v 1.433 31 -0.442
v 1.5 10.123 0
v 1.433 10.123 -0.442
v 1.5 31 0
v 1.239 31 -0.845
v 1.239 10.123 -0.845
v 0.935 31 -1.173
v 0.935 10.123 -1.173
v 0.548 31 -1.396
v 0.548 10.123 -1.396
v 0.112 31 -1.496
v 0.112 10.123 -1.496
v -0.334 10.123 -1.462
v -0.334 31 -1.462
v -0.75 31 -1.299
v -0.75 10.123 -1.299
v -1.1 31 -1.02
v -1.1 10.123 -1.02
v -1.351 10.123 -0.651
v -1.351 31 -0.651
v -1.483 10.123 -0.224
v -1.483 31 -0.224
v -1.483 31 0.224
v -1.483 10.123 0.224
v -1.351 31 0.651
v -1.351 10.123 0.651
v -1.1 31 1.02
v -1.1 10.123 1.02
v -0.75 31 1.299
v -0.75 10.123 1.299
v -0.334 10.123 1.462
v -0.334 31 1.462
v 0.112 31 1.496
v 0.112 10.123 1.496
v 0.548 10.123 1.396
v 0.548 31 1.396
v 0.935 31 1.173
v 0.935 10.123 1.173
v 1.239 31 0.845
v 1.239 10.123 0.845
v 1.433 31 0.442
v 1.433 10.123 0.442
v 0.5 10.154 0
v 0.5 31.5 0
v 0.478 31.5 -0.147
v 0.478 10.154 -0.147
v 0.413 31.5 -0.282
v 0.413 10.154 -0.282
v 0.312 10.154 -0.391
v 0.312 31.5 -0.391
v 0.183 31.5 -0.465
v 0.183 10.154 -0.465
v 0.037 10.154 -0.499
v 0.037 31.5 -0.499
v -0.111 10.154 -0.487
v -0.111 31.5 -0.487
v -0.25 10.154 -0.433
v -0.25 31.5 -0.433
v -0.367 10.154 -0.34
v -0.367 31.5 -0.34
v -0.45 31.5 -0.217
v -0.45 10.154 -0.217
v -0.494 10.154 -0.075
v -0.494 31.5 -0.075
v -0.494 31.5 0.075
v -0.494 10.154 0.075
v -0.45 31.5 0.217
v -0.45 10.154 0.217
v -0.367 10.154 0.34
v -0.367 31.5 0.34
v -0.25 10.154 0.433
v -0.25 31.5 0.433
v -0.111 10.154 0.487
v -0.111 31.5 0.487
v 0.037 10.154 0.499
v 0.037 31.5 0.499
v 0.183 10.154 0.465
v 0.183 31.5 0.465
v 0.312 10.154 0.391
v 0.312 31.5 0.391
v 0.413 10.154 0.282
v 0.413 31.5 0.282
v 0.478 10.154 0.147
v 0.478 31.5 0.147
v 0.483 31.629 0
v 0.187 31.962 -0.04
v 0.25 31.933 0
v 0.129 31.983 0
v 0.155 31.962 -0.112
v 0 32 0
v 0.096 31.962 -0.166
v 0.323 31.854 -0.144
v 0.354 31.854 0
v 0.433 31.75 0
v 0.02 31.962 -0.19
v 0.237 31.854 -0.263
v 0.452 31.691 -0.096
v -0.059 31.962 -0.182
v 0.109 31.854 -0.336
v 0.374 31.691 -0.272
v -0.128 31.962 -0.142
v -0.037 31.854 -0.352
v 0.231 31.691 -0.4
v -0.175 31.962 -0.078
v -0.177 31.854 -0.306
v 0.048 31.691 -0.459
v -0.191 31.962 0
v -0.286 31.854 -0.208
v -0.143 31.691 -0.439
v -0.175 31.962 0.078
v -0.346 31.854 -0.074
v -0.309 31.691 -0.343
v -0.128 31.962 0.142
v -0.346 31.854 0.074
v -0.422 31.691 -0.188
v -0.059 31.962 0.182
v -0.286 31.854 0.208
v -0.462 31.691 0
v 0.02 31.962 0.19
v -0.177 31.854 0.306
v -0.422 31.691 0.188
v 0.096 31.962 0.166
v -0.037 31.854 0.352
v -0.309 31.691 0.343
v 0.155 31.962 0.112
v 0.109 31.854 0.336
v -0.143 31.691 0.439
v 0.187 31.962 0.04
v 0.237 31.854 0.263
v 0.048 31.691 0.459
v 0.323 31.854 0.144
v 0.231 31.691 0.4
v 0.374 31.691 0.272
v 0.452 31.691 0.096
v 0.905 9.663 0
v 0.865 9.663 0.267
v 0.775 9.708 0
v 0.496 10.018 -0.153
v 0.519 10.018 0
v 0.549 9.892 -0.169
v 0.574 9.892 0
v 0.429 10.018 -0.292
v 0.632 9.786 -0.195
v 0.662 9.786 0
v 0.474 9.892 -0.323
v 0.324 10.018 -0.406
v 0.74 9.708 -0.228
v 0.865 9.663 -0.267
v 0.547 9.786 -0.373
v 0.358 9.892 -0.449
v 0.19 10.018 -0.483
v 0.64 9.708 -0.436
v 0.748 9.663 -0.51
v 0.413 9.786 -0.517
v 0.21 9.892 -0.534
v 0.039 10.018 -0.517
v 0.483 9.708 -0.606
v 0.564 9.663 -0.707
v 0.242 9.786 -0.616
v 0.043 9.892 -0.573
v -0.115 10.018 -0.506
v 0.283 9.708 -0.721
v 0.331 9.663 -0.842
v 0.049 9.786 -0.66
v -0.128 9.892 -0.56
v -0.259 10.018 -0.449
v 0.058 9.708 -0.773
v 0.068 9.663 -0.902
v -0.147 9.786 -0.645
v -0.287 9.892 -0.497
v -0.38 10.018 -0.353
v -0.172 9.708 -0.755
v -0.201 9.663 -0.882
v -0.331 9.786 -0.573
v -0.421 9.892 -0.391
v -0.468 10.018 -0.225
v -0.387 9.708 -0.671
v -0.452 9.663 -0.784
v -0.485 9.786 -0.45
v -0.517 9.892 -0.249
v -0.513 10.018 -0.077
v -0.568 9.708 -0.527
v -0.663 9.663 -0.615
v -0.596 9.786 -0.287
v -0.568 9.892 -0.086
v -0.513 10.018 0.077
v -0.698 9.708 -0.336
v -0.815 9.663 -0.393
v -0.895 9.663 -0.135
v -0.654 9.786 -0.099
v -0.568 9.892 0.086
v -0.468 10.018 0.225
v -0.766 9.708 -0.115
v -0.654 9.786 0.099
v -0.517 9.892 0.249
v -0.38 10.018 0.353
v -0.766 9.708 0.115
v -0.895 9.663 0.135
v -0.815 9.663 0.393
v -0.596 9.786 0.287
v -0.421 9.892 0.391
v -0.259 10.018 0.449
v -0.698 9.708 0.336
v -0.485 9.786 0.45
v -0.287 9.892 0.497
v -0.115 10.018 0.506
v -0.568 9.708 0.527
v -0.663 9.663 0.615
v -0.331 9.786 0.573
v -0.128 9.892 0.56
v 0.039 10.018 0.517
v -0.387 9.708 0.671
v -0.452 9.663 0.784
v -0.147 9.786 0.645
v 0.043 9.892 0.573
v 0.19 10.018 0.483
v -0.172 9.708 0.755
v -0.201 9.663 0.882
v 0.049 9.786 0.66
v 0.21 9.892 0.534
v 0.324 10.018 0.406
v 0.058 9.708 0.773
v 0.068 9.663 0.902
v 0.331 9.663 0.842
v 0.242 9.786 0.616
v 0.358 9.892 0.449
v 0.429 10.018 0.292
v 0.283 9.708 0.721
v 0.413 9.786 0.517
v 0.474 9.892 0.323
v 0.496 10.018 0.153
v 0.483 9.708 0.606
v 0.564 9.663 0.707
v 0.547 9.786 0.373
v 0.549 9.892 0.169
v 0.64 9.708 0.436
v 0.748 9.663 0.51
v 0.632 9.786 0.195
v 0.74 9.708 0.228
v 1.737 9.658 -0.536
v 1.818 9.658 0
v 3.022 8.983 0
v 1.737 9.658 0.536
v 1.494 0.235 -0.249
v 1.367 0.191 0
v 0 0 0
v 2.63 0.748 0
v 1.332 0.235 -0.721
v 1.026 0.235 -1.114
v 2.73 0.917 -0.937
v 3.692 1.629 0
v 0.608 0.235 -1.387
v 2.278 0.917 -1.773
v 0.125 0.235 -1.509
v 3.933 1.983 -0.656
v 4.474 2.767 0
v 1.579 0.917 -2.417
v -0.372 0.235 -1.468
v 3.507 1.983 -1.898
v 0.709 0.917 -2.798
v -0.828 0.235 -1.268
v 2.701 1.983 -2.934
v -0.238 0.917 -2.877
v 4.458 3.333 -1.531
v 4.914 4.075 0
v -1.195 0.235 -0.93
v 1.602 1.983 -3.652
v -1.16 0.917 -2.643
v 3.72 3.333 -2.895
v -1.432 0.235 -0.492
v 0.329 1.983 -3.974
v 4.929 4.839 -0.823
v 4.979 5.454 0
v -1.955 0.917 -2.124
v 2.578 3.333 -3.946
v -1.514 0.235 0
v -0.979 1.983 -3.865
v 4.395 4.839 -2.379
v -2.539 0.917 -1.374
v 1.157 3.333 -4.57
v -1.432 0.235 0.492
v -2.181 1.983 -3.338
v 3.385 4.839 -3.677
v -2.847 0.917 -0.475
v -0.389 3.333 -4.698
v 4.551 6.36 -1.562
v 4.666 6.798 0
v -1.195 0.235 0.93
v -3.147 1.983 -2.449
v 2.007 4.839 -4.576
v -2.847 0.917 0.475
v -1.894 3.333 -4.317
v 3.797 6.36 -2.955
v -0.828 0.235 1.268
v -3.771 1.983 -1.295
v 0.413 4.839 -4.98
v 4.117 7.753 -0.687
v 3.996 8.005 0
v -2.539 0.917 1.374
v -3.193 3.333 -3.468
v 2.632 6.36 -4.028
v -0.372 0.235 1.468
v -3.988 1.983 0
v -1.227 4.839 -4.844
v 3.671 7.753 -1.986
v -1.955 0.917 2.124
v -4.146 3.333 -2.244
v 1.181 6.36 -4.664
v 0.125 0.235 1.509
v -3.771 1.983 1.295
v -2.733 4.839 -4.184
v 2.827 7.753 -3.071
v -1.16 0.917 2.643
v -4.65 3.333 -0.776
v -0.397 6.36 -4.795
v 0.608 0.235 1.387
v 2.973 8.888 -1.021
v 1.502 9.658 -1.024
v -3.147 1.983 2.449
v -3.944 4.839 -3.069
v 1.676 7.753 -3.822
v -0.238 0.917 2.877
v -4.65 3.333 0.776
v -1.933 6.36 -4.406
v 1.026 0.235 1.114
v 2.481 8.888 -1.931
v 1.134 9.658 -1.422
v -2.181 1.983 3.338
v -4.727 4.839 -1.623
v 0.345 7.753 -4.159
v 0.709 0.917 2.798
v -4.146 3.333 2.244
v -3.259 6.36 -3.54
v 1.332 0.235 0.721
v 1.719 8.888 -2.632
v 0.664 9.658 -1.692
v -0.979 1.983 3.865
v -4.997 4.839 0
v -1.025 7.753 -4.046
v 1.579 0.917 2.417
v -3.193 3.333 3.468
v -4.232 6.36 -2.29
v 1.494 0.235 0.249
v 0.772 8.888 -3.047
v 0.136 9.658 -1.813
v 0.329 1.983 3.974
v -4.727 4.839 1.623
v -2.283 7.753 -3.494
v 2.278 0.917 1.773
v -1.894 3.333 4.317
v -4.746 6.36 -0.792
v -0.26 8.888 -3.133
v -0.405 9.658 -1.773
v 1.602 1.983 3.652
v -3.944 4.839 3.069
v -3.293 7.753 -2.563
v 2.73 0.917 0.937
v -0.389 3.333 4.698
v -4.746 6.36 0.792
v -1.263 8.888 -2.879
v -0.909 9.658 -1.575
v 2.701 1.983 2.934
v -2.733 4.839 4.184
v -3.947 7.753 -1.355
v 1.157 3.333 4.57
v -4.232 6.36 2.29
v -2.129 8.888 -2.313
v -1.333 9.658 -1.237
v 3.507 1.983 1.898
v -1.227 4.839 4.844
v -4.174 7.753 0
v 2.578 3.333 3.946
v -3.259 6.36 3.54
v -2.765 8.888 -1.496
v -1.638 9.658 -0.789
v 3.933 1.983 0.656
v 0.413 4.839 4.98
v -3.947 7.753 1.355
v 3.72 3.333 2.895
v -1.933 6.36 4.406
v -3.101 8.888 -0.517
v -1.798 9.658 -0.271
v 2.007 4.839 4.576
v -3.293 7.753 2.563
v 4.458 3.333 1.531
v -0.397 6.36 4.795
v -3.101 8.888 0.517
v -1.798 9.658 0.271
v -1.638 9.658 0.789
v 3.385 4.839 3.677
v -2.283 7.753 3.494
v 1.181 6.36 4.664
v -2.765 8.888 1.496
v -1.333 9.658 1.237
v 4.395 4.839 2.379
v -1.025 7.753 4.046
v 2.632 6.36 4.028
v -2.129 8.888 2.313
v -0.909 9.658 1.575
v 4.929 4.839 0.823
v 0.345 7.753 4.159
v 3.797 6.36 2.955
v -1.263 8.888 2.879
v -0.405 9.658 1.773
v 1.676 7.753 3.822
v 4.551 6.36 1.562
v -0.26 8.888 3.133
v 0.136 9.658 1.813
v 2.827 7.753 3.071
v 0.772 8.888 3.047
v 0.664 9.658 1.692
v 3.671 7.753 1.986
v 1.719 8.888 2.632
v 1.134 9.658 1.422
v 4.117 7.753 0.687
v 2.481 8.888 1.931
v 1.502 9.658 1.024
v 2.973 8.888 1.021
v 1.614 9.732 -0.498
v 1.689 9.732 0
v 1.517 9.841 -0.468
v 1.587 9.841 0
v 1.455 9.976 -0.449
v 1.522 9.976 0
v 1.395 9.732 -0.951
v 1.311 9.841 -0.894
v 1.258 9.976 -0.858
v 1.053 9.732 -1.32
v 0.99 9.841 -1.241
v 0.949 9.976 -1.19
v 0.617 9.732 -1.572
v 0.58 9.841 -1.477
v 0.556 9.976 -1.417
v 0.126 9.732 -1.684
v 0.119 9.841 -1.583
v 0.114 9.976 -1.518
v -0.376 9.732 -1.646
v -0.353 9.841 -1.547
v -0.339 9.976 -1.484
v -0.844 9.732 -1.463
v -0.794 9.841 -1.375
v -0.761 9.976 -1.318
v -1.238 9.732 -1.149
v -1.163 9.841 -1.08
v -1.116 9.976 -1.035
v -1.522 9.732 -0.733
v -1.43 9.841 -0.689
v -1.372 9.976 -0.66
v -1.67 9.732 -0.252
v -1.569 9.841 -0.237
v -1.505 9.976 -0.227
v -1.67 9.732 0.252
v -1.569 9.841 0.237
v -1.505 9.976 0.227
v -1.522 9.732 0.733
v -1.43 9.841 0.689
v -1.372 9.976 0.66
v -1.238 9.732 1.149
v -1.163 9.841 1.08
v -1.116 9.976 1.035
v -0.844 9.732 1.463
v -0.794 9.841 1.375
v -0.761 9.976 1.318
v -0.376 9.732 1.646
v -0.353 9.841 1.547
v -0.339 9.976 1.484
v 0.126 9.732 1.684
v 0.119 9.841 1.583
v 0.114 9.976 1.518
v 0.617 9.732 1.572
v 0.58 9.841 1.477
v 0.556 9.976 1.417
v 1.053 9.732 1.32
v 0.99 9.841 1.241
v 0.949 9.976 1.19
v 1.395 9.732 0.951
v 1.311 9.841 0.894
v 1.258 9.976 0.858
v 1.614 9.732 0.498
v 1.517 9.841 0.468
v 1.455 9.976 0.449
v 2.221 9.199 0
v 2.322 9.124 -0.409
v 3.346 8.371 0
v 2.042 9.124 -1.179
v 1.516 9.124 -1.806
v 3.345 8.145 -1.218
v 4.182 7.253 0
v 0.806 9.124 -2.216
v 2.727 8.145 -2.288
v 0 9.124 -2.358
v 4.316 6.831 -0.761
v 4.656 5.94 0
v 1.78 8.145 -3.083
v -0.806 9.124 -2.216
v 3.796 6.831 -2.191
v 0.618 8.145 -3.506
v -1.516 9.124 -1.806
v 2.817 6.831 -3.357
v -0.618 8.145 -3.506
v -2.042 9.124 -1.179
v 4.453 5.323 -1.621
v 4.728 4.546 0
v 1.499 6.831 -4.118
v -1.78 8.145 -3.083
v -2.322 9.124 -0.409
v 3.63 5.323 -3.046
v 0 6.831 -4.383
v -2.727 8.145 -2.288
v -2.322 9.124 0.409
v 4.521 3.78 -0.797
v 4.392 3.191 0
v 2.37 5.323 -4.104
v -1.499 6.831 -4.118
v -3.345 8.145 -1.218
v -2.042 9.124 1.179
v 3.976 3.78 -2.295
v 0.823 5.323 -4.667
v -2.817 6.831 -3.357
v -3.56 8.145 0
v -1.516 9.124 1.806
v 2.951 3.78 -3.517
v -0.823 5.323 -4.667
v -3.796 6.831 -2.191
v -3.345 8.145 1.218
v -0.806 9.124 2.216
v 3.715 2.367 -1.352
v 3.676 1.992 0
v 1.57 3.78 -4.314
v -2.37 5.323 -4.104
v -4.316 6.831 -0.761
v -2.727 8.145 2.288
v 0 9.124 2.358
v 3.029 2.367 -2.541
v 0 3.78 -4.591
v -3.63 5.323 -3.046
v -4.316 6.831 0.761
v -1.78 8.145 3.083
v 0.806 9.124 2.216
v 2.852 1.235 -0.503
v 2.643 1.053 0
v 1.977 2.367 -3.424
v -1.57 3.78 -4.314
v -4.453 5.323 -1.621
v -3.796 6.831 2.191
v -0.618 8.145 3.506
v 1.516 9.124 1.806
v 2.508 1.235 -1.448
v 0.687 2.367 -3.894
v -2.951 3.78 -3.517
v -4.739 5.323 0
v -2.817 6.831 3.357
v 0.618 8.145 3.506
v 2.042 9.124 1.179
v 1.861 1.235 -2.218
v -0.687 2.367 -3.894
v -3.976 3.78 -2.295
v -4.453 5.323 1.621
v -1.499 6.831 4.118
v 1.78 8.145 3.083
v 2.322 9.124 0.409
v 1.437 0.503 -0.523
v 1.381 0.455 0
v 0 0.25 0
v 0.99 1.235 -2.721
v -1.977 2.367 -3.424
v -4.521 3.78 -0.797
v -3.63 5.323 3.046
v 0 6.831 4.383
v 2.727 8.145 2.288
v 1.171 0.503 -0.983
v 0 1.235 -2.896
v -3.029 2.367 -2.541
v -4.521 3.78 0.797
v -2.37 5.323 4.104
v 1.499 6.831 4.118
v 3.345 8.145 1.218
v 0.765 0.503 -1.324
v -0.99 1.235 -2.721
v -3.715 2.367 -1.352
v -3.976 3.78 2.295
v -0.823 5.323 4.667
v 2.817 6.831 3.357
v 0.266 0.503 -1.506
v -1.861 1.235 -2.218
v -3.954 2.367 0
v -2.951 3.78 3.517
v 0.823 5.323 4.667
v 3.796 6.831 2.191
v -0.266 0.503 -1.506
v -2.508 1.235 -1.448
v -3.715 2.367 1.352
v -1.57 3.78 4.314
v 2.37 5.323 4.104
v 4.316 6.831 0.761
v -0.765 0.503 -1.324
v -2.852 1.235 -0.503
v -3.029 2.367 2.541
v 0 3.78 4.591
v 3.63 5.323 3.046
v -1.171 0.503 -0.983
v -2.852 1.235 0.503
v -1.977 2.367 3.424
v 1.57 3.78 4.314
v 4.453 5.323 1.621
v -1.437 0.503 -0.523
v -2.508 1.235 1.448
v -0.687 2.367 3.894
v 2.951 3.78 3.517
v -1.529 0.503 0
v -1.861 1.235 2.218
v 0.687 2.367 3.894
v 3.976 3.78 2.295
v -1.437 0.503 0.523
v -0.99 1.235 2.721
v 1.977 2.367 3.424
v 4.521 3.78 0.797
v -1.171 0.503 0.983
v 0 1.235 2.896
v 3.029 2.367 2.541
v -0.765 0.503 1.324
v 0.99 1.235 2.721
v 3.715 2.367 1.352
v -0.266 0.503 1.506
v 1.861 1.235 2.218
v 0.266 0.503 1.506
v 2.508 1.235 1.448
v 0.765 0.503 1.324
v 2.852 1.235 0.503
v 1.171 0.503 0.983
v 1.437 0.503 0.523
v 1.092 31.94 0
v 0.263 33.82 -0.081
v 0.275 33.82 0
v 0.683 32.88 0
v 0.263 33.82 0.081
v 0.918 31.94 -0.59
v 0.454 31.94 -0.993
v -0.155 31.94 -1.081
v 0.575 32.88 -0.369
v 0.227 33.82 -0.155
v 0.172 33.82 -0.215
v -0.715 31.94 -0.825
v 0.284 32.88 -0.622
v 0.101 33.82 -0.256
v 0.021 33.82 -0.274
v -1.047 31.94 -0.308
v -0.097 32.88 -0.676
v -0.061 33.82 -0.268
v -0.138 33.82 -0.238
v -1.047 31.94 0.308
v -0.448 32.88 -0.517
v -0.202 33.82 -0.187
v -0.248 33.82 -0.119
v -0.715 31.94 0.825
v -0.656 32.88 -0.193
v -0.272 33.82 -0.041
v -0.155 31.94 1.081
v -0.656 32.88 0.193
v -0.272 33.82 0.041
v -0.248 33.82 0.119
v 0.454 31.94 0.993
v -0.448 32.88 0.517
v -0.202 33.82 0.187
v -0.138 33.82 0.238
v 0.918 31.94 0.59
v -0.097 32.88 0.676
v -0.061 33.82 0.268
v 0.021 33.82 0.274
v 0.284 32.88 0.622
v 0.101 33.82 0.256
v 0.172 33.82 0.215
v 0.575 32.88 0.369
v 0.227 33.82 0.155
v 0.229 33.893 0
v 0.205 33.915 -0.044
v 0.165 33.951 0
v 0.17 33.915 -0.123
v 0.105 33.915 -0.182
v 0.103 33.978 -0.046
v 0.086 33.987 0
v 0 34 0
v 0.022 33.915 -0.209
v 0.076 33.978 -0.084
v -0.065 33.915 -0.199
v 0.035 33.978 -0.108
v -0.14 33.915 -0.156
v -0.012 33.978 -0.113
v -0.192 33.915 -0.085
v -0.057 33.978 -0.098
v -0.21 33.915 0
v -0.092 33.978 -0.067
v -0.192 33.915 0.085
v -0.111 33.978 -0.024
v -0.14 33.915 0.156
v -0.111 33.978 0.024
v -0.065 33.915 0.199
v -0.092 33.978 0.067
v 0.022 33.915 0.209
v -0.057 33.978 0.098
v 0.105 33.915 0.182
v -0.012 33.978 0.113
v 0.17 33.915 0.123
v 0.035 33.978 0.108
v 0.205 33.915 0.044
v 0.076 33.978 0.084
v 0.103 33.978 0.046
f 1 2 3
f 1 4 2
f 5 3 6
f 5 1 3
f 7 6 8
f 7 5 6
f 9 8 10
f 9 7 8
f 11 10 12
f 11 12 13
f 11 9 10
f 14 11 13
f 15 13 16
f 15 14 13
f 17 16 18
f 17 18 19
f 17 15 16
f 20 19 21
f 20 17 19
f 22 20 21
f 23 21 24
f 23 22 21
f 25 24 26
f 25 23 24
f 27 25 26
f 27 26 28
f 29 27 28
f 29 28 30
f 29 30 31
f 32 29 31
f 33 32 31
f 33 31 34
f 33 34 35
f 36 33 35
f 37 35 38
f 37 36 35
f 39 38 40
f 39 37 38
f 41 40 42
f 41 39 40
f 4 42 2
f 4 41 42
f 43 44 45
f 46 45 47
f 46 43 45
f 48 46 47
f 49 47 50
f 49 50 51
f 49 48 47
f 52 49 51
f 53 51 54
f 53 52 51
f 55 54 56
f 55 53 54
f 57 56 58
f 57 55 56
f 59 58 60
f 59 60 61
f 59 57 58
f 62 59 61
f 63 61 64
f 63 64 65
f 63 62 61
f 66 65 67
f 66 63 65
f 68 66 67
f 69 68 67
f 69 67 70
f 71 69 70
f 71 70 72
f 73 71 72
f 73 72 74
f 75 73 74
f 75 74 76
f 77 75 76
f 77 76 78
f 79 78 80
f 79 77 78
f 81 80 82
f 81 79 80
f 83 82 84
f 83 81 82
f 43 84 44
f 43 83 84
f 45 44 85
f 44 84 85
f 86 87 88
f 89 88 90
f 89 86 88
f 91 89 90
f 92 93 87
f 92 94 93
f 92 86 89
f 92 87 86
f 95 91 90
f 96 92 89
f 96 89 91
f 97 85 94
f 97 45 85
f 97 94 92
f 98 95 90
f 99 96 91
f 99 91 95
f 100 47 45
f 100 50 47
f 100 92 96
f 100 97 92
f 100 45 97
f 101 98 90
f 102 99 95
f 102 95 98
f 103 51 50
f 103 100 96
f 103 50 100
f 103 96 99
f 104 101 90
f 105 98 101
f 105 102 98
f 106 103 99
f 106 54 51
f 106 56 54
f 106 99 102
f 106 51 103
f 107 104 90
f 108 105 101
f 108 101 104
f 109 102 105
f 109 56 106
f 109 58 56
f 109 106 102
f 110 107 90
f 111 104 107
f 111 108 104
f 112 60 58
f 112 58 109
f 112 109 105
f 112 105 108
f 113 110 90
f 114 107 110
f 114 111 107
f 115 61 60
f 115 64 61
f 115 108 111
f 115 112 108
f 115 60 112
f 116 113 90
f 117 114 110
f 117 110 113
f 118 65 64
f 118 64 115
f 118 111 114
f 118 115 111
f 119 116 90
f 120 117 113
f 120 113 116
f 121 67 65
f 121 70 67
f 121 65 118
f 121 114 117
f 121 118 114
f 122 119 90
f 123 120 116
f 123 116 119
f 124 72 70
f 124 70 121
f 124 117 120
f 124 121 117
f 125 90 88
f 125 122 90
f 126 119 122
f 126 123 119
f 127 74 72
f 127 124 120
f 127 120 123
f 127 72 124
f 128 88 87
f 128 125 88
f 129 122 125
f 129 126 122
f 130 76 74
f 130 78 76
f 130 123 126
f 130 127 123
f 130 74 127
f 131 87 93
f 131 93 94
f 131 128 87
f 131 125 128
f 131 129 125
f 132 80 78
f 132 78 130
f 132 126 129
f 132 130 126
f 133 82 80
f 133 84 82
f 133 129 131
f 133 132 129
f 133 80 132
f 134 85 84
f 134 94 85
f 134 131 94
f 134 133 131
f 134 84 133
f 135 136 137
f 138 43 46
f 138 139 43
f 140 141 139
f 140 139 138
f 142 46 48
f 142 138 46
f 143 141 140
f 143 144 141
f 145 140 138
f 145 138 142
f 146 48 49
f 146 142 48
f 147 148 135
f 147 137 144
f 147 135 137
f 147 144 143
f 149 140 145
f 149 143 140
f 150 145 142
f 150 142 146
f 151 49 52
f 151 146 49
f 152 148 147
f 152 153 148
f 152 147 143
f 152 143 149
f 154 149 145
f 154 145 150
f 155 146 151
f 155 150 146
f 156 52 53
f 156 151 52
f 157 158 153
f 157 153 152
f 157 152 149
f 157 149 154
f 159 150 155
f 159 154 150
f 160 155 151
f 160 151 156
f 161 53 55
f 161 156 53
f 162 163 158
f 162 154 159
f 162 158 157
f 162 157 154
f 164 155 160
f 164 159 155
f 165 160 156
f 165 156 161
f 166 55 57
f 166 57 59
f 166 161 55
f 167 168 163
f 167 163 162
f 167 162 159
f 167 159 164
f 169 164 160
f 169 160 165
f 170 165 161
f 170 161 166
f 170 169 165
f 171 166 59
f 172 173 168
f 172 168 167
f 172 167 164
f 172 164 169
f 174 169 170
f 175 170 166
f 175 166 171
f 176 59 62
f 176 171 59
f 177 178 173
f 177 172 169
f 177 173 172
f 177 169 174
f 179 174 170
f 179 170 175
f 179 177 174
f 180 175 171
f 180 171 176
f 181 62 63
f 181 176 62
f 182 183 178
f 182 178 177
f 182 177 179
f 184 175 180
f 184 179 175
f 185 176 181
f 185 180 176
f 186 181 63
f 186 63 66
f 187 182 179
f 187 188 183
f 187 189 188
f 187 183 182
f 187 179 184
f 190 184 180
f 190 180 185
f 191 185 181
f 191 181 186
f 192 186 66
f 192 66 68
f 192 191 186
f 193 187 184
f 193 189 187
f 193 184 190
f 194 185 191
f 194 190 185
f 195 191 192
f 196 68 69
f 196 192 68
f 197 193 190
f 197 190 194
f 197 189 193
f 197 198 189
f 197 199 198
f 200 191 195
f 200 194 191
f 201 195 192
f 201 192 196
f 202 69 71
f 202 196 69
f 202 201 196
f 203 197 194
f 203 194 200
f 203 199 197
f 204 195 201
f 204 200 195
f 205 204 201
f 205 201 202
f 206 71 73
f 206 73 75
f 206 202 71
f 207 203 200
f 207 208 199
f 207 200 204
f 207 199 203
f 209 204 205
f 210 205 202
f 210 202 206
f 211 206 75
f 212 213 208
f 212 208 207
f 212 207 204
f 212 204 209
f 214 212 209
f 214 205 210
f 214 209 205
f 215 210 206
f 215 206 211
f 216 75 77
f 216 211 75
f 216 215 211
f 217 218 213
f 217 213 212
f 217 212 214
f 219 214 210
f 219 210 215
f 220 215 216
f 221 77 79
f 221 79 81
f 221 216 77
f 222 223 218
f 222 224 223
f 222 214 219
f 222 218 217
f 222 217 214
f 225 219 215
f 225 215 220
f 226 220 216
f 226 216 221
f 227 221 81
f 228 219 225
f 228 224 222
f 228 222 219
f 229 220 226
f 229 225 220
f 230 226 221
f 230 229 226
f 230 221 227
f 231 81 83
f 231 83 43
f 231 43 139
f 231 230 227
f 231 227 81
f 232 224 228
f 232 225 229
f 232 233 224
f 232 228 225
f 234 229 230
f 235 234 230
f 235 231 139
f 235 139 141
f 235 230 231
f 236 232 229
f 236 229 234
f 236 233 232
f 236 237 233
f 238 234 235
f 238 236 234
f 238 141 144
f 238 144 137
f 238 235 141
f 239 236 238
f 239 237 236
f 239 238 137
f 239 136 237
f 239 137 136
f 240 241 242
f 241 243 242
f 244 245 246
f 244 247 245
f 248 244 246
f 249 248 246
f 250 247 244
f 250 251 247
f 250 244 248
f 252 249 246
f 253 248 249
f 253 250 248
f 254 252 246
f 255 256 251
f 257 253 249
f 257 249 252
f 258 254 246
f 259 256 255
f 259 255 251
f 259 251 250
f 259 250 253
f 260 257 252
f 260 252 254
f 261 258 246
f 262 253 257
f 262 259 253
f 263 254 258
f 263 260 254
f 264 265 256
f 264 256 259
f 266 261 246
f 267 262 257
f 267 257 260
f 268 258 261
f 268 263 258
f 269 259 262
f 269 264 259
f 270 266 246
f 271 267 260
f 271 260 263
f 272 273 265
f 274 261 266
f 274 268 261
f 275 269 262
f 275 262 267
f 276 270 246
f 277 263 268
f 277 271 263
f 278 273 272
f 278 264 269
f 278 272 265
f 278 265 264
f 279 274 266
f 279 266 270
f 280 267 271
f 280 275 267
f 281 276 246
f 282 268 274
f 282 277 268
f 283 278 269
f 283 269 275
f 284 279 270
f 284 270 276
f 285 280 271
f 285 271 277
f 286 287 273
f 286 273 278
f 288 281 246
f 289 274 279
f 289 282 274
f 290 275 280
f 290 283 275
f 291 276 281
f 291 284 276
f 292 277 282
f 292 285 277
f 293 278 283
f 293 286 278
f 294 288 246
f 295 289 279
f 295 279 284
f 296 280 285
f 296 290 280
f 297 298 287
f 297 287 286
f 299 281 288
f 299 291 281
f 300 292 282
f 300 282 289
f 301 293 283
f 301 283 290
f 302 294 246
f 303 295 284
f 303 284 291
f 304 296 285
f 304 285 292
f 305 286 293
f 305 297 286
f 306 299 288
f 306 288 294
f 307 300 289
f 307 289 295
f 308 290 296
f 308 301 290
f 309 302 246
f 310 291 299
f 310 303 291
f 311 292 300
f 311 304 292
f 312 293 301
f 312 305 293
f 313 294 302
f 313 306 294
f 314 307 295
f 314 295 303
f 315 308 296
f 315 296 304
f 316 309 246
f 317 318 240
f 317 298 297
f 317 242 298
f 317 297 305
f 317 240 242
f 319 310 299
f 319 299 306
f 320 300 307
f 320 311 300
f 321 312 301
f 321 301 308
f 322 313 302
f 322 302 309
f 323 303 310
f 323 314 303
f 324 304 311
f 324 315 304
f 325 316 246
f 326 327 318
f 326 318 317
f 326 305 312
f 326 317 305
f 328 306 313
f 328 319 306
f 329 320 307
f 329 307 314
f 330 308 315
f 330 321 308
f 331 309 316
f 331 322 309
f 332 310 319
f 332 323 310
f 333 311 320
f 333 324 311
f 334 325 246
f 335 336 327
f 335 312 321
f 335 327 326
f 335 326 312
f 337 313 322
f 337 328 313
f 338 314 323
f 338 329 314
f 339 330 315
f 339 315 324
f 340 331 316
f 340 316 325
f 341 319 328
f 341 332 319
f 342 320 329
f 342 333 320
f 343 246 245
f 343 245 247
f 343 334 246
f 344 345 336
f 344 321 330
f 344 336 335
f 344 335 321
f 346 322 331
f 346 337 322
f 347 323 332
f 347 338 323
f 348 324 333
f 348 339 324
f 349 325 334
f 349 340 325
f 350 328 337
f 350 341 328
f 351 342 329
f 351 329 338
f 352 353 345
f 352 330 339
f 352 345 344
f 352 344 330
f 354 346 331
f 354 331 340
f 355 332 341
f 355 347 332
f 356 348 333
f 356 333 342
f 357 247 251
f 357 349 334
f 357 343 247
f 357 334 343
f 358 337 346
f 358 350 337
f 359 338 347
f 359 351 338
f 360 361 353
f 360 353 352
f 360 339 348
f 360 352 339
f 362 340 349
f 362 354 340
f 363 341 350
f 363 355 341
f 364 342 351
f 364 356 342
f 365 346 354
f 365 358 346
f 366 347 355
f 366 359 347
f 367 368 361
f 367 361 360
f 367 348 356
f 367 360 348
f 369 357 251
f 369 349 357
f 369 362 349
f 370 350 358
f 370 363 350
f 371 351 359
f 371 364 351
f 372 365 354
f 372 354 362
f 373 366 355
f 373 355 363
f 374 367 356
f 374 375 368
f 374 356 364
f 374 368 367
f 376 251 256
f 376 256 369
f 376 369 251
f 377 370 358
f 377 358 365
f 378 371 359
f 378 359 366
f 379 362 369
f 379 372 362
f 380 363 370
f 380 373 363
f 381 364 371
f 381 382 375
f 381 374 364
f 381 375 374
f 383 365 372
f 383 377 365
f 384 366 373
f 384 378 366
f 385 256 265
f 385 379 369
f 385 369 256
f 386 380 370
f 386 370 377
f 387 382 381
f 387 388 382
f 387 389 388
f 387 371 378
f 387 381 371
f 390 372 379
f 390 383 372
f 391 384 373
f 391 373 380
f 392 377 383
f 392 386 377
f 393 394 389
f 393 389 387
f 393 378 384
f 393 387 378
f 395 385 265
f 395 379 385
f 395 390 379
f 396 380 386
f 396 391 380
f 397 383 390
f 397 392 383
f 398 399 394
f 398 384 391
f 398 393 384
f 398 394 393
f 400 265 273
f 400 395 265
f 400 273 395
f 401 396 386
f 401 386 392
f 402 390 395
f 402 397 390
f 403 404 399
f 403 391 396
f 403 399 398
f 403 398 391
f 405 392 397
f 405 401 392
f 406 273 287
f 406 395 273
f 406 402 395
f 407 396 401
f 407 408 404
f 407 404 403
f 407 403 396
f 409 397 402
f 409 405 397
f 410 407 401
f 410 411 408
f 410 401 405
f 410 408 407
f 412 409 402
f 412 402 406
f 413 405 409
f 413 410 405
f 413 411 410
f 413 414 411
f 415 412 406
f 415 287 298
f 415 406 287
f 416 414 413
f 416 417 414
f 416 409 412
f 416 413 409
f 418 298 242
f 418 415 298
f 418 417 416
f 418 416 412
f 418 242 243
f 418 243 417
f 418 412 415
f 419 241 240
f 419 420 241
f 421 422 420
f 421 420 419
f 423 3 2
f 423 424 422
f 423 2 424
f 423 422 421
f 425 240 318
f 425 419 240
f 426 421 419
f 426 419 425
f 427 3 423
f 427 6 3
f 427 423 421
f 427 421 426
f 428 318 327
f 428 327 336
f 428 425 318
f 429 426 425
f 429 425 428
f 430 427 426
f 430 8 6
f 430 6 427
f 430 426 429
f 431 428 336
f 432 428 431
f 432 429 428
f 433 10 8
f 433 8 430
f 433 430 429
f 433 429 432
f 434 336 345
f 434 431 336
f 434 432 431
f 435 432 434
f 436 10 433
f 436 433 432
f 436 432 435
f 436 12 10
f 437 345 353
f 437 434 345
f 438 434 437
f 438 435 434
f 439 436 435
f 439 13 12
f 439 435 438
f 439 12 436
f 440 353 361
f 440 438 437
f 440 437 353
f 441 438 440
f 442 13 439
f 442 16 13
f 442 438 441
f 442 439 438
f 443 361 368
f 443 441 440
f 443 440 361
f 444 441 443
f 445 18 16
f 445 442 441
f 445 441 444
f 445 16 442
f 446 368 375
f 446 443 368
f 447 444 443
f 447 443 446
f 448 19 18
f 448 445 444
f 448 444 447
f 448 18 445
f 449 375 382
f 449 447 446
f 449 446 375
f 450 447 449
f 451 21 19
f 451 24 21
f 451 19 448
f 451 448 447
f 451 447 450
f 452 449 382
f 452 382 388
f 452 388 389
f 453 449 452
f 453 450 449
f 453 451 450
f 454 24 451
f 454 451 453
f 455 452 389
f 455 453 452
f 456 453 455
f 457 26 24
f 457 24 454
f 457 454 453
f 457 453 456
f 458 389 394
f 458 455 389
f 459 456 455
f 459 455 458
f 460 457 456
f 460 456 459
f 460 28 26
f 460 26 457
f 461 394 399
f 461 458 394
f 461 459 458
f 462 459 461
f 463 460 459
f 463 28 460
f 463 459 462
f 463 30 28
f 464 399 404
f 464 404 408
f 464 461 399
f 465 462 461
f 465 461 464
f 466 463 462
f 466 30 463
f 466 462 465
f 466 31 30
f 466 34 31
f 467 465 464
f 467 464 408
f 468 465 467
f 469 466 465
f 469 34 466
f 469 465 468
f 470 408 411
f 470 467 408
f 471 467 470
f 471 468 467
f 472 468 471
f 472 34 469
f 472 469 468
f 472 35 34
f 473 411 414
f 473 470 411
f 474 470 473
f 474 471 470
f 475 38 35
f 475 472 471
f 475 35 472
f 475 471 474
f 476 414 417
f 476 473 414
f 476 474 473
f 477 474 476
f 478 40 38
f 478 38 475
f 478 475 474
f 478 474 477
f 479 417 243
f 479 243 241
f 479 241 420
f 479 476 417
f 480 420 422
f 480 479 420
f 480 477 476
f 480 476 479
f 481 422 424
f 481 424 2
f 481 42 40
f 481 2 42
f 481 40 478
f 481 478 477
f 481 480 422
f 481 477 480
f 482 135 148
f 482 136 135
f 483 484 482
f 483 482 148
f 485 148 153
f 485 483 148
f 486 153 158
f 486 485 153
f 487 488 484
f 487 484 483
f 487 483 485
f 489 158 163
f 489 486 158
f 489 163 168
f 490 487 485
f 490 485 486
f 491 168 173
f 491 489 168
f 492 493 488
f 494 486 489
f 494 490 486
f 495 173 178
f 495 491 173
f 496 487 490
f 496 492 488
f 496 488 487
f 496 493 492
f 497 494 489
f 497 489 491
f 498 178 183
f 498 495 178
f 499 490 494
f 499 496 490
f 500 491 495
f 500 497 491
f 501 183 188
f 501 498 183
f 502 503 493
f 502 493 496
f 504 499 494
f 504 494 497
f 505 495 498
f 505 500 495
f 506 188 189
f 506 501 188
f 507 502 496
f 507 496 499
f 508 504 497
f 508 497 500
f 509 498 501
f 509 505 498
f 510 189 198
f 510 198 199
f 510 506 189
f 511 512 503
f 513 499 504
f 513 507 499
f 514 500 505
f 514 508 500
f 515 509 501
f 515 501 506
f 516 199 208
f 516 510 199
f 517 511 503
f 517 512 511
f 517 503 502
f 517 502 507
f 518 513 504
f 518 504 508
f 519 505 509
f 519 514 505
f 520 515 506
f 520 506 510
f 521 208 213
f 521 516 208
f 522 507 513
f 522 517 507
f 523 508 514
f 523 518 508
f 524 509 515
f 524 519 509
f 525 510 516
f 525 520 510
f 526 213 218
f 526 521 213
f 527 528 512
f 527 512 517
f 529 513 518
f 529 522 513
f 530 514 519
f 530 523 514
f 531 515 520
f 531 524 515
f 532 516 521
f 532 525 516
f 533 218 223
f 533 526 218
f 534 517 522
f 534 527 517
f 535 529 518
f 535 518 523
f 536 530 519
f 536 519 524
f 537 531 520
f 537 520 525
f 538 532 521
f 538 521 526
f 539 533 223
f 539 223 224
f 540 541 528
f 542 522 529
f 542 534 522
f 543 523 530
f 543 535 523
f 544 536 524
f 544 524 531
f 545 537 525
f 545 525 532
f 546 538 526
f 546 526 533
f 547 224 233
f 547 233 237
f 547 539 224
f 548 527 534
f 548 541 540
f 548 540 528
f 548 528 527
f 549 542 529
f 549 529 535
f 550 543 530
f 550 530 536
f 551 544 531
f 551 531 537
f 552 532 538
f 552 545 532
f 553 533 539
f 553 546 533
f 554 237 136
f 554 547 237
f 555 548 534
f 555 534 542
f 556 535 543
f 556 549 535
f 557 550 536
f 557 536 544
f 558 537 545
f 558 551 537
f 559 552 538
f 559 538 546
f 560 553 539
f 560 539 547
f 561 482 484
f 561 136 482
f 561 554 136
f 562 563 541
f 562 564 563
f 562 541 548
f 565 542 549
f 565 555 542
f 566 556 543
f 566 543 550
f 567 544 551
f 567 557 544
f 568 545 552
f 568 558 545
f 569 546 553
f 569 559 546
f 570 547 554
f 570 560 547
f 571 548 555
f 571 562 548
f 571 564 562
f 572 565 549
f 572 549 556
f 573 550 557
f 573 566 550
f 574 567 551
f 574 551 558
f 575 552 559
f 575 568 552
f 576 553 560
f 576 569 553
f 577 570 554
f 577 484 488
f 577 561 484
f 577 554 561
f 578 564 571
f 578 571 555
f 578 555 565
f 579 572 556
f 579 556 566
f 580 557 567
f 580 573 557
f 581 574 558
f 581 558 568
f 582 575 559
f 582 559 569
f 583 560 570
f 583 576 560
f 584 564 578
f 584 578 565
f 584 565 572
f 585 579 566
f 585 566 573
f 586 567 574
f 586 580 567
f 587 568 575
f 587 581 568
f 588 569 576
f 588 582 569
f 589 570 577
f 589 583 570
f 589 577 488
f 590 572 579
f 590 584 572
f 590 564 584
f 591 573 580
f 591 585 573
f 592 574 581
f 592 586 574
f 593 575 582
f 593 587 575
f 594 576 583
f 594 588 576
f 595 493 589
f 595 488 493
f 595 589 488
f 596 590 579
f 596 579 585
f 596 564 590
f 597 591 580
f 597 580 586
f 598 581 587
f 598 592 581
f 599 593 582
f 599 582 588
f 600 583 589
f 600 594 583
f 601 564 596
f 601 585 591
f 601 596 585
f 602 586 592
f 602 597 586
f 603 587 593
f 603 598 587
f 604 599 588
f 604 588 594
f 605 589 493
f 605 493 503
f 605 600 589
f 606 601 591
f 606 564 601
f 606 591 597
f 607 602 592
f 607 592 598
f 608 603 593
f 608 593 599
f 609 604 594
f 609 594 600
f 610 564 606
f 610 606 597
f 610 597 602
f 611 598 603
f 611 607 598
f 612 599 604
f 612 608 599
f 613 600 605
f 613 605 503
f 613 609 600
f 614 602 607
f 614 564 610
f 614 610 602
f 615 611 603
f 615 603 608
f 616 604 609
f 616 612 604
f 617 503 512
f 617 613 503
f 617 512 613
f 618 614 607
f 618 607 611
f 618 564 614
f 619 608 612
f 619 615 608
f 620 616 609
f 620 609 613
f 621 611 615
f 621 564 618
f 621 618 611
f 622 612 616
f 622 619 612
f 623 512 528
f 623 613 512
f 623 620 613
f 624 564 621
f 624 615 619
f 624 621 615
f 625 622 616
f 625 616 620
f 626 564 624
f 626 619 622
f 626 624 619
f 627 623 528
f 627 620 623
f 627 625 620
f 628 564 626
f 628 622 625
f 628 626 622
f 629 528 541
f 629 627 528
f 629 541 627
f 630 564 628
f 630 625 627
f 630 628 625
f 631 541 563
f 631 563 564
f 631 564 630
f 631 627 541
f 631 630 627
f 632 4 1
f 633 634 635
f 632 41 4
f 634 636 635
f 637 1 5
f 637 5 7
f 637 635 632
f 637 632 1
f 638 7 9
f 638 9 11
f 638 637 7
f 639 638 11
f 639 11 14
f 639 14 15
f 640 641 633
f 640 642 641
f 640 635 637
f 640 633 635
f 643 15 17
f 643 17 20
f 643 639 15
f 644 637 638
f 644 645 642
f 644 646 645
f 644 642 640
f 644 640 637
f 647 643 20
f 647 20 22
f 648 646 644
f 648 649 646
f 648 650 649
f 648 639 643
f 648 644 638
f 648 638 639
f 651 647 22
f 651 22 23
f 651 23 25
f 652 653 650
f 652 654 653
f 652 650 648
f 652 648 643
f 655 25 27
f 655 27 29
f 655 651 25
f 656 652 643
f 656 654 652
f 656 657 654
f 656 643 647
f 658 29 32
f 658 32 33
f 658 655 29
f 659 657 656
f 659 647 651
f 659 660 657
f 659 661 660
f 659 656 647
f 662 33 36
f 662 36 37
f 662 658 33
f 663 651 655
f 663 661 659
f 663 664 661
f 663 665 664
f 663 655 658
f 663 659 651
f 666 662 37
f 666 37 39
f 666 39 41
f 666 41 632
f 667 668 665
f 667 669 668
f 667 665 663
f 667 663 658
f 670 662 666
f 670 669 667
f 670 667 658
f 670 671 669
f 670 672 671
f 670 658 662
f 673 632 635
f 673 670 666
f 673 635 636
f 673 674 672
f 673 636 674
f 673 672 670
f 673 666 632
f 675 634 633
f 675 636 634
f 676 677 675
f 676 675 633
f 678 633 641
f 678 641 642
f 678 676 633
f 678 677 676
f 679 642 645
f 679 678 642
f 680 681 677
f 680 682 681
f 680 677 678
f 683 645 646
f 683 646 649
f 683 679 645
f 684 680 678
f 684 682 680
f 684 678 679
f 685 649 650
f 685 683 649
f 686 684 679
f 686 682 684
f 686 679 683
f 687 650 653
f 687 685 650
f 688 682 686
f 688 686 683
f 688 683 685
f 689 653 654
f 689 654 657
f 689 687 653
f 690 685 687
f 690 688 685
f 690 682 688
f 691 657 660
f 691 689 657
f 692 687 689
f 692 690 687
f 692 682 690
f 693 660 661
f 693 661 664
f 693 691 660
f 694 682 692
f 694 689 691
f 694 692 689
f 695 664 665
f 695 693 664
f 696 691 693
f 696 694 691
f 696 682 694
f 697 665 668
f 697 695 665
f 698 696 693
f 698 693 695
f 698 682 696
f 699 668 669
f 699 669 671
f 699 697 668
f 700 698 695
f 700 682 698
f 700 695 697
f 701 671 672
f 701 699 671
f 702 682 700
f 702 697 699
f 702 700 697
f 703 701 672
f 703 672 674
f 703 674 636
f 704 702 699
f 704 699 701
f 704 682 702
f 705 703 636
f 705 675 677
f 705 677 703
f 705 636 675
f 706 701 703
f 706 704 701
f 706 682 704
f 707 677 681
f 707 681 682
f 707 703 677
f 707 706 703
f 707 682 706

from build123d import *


with BuildPart() as part:
    # Эскиз1 → Повернуть1 (revolve)
    with BuildSketch(Plane.XY):
        with BuildLine():
            Line((1.5, 31), (0.27515818, 33.819532322))
            ThreePointArc((0.27515818, 33.819532322), (0.164530094, 33.950858224), (0, 34))
            Line((0, 34), (0, 32))
            ThreePointArc((0, 32), (0.353553391, 31.853553391), (0.5, 31.5))
            Line((0.5, 31.5), (0.5, 10.153882032))
            ThreePointArc((0.5, 10.153882032), (0.614241625, 9.835777527), (0.904761905, 9.663036124))
            ThreePointArc((0.904761905, 9.663036124), (4.728209047, 4.545534154), (0, 0.25))
            Line((0, 0.25), (0, 0))
            ThreePointArc((0, 0), (4.913681129, 4.074939047), (1.818181818, 9.657704894))
            ThreePointArc((1.818181818, 9.657704894), (1.587138588, 9.841437346), (1.5, 10.123475383))
            Line((1.5, 10.123475383), (1.5, 31))
        make_face()
    revolve(axis=Axis((0, 0, 0), (0, 1, 0)))


solid = part.part
